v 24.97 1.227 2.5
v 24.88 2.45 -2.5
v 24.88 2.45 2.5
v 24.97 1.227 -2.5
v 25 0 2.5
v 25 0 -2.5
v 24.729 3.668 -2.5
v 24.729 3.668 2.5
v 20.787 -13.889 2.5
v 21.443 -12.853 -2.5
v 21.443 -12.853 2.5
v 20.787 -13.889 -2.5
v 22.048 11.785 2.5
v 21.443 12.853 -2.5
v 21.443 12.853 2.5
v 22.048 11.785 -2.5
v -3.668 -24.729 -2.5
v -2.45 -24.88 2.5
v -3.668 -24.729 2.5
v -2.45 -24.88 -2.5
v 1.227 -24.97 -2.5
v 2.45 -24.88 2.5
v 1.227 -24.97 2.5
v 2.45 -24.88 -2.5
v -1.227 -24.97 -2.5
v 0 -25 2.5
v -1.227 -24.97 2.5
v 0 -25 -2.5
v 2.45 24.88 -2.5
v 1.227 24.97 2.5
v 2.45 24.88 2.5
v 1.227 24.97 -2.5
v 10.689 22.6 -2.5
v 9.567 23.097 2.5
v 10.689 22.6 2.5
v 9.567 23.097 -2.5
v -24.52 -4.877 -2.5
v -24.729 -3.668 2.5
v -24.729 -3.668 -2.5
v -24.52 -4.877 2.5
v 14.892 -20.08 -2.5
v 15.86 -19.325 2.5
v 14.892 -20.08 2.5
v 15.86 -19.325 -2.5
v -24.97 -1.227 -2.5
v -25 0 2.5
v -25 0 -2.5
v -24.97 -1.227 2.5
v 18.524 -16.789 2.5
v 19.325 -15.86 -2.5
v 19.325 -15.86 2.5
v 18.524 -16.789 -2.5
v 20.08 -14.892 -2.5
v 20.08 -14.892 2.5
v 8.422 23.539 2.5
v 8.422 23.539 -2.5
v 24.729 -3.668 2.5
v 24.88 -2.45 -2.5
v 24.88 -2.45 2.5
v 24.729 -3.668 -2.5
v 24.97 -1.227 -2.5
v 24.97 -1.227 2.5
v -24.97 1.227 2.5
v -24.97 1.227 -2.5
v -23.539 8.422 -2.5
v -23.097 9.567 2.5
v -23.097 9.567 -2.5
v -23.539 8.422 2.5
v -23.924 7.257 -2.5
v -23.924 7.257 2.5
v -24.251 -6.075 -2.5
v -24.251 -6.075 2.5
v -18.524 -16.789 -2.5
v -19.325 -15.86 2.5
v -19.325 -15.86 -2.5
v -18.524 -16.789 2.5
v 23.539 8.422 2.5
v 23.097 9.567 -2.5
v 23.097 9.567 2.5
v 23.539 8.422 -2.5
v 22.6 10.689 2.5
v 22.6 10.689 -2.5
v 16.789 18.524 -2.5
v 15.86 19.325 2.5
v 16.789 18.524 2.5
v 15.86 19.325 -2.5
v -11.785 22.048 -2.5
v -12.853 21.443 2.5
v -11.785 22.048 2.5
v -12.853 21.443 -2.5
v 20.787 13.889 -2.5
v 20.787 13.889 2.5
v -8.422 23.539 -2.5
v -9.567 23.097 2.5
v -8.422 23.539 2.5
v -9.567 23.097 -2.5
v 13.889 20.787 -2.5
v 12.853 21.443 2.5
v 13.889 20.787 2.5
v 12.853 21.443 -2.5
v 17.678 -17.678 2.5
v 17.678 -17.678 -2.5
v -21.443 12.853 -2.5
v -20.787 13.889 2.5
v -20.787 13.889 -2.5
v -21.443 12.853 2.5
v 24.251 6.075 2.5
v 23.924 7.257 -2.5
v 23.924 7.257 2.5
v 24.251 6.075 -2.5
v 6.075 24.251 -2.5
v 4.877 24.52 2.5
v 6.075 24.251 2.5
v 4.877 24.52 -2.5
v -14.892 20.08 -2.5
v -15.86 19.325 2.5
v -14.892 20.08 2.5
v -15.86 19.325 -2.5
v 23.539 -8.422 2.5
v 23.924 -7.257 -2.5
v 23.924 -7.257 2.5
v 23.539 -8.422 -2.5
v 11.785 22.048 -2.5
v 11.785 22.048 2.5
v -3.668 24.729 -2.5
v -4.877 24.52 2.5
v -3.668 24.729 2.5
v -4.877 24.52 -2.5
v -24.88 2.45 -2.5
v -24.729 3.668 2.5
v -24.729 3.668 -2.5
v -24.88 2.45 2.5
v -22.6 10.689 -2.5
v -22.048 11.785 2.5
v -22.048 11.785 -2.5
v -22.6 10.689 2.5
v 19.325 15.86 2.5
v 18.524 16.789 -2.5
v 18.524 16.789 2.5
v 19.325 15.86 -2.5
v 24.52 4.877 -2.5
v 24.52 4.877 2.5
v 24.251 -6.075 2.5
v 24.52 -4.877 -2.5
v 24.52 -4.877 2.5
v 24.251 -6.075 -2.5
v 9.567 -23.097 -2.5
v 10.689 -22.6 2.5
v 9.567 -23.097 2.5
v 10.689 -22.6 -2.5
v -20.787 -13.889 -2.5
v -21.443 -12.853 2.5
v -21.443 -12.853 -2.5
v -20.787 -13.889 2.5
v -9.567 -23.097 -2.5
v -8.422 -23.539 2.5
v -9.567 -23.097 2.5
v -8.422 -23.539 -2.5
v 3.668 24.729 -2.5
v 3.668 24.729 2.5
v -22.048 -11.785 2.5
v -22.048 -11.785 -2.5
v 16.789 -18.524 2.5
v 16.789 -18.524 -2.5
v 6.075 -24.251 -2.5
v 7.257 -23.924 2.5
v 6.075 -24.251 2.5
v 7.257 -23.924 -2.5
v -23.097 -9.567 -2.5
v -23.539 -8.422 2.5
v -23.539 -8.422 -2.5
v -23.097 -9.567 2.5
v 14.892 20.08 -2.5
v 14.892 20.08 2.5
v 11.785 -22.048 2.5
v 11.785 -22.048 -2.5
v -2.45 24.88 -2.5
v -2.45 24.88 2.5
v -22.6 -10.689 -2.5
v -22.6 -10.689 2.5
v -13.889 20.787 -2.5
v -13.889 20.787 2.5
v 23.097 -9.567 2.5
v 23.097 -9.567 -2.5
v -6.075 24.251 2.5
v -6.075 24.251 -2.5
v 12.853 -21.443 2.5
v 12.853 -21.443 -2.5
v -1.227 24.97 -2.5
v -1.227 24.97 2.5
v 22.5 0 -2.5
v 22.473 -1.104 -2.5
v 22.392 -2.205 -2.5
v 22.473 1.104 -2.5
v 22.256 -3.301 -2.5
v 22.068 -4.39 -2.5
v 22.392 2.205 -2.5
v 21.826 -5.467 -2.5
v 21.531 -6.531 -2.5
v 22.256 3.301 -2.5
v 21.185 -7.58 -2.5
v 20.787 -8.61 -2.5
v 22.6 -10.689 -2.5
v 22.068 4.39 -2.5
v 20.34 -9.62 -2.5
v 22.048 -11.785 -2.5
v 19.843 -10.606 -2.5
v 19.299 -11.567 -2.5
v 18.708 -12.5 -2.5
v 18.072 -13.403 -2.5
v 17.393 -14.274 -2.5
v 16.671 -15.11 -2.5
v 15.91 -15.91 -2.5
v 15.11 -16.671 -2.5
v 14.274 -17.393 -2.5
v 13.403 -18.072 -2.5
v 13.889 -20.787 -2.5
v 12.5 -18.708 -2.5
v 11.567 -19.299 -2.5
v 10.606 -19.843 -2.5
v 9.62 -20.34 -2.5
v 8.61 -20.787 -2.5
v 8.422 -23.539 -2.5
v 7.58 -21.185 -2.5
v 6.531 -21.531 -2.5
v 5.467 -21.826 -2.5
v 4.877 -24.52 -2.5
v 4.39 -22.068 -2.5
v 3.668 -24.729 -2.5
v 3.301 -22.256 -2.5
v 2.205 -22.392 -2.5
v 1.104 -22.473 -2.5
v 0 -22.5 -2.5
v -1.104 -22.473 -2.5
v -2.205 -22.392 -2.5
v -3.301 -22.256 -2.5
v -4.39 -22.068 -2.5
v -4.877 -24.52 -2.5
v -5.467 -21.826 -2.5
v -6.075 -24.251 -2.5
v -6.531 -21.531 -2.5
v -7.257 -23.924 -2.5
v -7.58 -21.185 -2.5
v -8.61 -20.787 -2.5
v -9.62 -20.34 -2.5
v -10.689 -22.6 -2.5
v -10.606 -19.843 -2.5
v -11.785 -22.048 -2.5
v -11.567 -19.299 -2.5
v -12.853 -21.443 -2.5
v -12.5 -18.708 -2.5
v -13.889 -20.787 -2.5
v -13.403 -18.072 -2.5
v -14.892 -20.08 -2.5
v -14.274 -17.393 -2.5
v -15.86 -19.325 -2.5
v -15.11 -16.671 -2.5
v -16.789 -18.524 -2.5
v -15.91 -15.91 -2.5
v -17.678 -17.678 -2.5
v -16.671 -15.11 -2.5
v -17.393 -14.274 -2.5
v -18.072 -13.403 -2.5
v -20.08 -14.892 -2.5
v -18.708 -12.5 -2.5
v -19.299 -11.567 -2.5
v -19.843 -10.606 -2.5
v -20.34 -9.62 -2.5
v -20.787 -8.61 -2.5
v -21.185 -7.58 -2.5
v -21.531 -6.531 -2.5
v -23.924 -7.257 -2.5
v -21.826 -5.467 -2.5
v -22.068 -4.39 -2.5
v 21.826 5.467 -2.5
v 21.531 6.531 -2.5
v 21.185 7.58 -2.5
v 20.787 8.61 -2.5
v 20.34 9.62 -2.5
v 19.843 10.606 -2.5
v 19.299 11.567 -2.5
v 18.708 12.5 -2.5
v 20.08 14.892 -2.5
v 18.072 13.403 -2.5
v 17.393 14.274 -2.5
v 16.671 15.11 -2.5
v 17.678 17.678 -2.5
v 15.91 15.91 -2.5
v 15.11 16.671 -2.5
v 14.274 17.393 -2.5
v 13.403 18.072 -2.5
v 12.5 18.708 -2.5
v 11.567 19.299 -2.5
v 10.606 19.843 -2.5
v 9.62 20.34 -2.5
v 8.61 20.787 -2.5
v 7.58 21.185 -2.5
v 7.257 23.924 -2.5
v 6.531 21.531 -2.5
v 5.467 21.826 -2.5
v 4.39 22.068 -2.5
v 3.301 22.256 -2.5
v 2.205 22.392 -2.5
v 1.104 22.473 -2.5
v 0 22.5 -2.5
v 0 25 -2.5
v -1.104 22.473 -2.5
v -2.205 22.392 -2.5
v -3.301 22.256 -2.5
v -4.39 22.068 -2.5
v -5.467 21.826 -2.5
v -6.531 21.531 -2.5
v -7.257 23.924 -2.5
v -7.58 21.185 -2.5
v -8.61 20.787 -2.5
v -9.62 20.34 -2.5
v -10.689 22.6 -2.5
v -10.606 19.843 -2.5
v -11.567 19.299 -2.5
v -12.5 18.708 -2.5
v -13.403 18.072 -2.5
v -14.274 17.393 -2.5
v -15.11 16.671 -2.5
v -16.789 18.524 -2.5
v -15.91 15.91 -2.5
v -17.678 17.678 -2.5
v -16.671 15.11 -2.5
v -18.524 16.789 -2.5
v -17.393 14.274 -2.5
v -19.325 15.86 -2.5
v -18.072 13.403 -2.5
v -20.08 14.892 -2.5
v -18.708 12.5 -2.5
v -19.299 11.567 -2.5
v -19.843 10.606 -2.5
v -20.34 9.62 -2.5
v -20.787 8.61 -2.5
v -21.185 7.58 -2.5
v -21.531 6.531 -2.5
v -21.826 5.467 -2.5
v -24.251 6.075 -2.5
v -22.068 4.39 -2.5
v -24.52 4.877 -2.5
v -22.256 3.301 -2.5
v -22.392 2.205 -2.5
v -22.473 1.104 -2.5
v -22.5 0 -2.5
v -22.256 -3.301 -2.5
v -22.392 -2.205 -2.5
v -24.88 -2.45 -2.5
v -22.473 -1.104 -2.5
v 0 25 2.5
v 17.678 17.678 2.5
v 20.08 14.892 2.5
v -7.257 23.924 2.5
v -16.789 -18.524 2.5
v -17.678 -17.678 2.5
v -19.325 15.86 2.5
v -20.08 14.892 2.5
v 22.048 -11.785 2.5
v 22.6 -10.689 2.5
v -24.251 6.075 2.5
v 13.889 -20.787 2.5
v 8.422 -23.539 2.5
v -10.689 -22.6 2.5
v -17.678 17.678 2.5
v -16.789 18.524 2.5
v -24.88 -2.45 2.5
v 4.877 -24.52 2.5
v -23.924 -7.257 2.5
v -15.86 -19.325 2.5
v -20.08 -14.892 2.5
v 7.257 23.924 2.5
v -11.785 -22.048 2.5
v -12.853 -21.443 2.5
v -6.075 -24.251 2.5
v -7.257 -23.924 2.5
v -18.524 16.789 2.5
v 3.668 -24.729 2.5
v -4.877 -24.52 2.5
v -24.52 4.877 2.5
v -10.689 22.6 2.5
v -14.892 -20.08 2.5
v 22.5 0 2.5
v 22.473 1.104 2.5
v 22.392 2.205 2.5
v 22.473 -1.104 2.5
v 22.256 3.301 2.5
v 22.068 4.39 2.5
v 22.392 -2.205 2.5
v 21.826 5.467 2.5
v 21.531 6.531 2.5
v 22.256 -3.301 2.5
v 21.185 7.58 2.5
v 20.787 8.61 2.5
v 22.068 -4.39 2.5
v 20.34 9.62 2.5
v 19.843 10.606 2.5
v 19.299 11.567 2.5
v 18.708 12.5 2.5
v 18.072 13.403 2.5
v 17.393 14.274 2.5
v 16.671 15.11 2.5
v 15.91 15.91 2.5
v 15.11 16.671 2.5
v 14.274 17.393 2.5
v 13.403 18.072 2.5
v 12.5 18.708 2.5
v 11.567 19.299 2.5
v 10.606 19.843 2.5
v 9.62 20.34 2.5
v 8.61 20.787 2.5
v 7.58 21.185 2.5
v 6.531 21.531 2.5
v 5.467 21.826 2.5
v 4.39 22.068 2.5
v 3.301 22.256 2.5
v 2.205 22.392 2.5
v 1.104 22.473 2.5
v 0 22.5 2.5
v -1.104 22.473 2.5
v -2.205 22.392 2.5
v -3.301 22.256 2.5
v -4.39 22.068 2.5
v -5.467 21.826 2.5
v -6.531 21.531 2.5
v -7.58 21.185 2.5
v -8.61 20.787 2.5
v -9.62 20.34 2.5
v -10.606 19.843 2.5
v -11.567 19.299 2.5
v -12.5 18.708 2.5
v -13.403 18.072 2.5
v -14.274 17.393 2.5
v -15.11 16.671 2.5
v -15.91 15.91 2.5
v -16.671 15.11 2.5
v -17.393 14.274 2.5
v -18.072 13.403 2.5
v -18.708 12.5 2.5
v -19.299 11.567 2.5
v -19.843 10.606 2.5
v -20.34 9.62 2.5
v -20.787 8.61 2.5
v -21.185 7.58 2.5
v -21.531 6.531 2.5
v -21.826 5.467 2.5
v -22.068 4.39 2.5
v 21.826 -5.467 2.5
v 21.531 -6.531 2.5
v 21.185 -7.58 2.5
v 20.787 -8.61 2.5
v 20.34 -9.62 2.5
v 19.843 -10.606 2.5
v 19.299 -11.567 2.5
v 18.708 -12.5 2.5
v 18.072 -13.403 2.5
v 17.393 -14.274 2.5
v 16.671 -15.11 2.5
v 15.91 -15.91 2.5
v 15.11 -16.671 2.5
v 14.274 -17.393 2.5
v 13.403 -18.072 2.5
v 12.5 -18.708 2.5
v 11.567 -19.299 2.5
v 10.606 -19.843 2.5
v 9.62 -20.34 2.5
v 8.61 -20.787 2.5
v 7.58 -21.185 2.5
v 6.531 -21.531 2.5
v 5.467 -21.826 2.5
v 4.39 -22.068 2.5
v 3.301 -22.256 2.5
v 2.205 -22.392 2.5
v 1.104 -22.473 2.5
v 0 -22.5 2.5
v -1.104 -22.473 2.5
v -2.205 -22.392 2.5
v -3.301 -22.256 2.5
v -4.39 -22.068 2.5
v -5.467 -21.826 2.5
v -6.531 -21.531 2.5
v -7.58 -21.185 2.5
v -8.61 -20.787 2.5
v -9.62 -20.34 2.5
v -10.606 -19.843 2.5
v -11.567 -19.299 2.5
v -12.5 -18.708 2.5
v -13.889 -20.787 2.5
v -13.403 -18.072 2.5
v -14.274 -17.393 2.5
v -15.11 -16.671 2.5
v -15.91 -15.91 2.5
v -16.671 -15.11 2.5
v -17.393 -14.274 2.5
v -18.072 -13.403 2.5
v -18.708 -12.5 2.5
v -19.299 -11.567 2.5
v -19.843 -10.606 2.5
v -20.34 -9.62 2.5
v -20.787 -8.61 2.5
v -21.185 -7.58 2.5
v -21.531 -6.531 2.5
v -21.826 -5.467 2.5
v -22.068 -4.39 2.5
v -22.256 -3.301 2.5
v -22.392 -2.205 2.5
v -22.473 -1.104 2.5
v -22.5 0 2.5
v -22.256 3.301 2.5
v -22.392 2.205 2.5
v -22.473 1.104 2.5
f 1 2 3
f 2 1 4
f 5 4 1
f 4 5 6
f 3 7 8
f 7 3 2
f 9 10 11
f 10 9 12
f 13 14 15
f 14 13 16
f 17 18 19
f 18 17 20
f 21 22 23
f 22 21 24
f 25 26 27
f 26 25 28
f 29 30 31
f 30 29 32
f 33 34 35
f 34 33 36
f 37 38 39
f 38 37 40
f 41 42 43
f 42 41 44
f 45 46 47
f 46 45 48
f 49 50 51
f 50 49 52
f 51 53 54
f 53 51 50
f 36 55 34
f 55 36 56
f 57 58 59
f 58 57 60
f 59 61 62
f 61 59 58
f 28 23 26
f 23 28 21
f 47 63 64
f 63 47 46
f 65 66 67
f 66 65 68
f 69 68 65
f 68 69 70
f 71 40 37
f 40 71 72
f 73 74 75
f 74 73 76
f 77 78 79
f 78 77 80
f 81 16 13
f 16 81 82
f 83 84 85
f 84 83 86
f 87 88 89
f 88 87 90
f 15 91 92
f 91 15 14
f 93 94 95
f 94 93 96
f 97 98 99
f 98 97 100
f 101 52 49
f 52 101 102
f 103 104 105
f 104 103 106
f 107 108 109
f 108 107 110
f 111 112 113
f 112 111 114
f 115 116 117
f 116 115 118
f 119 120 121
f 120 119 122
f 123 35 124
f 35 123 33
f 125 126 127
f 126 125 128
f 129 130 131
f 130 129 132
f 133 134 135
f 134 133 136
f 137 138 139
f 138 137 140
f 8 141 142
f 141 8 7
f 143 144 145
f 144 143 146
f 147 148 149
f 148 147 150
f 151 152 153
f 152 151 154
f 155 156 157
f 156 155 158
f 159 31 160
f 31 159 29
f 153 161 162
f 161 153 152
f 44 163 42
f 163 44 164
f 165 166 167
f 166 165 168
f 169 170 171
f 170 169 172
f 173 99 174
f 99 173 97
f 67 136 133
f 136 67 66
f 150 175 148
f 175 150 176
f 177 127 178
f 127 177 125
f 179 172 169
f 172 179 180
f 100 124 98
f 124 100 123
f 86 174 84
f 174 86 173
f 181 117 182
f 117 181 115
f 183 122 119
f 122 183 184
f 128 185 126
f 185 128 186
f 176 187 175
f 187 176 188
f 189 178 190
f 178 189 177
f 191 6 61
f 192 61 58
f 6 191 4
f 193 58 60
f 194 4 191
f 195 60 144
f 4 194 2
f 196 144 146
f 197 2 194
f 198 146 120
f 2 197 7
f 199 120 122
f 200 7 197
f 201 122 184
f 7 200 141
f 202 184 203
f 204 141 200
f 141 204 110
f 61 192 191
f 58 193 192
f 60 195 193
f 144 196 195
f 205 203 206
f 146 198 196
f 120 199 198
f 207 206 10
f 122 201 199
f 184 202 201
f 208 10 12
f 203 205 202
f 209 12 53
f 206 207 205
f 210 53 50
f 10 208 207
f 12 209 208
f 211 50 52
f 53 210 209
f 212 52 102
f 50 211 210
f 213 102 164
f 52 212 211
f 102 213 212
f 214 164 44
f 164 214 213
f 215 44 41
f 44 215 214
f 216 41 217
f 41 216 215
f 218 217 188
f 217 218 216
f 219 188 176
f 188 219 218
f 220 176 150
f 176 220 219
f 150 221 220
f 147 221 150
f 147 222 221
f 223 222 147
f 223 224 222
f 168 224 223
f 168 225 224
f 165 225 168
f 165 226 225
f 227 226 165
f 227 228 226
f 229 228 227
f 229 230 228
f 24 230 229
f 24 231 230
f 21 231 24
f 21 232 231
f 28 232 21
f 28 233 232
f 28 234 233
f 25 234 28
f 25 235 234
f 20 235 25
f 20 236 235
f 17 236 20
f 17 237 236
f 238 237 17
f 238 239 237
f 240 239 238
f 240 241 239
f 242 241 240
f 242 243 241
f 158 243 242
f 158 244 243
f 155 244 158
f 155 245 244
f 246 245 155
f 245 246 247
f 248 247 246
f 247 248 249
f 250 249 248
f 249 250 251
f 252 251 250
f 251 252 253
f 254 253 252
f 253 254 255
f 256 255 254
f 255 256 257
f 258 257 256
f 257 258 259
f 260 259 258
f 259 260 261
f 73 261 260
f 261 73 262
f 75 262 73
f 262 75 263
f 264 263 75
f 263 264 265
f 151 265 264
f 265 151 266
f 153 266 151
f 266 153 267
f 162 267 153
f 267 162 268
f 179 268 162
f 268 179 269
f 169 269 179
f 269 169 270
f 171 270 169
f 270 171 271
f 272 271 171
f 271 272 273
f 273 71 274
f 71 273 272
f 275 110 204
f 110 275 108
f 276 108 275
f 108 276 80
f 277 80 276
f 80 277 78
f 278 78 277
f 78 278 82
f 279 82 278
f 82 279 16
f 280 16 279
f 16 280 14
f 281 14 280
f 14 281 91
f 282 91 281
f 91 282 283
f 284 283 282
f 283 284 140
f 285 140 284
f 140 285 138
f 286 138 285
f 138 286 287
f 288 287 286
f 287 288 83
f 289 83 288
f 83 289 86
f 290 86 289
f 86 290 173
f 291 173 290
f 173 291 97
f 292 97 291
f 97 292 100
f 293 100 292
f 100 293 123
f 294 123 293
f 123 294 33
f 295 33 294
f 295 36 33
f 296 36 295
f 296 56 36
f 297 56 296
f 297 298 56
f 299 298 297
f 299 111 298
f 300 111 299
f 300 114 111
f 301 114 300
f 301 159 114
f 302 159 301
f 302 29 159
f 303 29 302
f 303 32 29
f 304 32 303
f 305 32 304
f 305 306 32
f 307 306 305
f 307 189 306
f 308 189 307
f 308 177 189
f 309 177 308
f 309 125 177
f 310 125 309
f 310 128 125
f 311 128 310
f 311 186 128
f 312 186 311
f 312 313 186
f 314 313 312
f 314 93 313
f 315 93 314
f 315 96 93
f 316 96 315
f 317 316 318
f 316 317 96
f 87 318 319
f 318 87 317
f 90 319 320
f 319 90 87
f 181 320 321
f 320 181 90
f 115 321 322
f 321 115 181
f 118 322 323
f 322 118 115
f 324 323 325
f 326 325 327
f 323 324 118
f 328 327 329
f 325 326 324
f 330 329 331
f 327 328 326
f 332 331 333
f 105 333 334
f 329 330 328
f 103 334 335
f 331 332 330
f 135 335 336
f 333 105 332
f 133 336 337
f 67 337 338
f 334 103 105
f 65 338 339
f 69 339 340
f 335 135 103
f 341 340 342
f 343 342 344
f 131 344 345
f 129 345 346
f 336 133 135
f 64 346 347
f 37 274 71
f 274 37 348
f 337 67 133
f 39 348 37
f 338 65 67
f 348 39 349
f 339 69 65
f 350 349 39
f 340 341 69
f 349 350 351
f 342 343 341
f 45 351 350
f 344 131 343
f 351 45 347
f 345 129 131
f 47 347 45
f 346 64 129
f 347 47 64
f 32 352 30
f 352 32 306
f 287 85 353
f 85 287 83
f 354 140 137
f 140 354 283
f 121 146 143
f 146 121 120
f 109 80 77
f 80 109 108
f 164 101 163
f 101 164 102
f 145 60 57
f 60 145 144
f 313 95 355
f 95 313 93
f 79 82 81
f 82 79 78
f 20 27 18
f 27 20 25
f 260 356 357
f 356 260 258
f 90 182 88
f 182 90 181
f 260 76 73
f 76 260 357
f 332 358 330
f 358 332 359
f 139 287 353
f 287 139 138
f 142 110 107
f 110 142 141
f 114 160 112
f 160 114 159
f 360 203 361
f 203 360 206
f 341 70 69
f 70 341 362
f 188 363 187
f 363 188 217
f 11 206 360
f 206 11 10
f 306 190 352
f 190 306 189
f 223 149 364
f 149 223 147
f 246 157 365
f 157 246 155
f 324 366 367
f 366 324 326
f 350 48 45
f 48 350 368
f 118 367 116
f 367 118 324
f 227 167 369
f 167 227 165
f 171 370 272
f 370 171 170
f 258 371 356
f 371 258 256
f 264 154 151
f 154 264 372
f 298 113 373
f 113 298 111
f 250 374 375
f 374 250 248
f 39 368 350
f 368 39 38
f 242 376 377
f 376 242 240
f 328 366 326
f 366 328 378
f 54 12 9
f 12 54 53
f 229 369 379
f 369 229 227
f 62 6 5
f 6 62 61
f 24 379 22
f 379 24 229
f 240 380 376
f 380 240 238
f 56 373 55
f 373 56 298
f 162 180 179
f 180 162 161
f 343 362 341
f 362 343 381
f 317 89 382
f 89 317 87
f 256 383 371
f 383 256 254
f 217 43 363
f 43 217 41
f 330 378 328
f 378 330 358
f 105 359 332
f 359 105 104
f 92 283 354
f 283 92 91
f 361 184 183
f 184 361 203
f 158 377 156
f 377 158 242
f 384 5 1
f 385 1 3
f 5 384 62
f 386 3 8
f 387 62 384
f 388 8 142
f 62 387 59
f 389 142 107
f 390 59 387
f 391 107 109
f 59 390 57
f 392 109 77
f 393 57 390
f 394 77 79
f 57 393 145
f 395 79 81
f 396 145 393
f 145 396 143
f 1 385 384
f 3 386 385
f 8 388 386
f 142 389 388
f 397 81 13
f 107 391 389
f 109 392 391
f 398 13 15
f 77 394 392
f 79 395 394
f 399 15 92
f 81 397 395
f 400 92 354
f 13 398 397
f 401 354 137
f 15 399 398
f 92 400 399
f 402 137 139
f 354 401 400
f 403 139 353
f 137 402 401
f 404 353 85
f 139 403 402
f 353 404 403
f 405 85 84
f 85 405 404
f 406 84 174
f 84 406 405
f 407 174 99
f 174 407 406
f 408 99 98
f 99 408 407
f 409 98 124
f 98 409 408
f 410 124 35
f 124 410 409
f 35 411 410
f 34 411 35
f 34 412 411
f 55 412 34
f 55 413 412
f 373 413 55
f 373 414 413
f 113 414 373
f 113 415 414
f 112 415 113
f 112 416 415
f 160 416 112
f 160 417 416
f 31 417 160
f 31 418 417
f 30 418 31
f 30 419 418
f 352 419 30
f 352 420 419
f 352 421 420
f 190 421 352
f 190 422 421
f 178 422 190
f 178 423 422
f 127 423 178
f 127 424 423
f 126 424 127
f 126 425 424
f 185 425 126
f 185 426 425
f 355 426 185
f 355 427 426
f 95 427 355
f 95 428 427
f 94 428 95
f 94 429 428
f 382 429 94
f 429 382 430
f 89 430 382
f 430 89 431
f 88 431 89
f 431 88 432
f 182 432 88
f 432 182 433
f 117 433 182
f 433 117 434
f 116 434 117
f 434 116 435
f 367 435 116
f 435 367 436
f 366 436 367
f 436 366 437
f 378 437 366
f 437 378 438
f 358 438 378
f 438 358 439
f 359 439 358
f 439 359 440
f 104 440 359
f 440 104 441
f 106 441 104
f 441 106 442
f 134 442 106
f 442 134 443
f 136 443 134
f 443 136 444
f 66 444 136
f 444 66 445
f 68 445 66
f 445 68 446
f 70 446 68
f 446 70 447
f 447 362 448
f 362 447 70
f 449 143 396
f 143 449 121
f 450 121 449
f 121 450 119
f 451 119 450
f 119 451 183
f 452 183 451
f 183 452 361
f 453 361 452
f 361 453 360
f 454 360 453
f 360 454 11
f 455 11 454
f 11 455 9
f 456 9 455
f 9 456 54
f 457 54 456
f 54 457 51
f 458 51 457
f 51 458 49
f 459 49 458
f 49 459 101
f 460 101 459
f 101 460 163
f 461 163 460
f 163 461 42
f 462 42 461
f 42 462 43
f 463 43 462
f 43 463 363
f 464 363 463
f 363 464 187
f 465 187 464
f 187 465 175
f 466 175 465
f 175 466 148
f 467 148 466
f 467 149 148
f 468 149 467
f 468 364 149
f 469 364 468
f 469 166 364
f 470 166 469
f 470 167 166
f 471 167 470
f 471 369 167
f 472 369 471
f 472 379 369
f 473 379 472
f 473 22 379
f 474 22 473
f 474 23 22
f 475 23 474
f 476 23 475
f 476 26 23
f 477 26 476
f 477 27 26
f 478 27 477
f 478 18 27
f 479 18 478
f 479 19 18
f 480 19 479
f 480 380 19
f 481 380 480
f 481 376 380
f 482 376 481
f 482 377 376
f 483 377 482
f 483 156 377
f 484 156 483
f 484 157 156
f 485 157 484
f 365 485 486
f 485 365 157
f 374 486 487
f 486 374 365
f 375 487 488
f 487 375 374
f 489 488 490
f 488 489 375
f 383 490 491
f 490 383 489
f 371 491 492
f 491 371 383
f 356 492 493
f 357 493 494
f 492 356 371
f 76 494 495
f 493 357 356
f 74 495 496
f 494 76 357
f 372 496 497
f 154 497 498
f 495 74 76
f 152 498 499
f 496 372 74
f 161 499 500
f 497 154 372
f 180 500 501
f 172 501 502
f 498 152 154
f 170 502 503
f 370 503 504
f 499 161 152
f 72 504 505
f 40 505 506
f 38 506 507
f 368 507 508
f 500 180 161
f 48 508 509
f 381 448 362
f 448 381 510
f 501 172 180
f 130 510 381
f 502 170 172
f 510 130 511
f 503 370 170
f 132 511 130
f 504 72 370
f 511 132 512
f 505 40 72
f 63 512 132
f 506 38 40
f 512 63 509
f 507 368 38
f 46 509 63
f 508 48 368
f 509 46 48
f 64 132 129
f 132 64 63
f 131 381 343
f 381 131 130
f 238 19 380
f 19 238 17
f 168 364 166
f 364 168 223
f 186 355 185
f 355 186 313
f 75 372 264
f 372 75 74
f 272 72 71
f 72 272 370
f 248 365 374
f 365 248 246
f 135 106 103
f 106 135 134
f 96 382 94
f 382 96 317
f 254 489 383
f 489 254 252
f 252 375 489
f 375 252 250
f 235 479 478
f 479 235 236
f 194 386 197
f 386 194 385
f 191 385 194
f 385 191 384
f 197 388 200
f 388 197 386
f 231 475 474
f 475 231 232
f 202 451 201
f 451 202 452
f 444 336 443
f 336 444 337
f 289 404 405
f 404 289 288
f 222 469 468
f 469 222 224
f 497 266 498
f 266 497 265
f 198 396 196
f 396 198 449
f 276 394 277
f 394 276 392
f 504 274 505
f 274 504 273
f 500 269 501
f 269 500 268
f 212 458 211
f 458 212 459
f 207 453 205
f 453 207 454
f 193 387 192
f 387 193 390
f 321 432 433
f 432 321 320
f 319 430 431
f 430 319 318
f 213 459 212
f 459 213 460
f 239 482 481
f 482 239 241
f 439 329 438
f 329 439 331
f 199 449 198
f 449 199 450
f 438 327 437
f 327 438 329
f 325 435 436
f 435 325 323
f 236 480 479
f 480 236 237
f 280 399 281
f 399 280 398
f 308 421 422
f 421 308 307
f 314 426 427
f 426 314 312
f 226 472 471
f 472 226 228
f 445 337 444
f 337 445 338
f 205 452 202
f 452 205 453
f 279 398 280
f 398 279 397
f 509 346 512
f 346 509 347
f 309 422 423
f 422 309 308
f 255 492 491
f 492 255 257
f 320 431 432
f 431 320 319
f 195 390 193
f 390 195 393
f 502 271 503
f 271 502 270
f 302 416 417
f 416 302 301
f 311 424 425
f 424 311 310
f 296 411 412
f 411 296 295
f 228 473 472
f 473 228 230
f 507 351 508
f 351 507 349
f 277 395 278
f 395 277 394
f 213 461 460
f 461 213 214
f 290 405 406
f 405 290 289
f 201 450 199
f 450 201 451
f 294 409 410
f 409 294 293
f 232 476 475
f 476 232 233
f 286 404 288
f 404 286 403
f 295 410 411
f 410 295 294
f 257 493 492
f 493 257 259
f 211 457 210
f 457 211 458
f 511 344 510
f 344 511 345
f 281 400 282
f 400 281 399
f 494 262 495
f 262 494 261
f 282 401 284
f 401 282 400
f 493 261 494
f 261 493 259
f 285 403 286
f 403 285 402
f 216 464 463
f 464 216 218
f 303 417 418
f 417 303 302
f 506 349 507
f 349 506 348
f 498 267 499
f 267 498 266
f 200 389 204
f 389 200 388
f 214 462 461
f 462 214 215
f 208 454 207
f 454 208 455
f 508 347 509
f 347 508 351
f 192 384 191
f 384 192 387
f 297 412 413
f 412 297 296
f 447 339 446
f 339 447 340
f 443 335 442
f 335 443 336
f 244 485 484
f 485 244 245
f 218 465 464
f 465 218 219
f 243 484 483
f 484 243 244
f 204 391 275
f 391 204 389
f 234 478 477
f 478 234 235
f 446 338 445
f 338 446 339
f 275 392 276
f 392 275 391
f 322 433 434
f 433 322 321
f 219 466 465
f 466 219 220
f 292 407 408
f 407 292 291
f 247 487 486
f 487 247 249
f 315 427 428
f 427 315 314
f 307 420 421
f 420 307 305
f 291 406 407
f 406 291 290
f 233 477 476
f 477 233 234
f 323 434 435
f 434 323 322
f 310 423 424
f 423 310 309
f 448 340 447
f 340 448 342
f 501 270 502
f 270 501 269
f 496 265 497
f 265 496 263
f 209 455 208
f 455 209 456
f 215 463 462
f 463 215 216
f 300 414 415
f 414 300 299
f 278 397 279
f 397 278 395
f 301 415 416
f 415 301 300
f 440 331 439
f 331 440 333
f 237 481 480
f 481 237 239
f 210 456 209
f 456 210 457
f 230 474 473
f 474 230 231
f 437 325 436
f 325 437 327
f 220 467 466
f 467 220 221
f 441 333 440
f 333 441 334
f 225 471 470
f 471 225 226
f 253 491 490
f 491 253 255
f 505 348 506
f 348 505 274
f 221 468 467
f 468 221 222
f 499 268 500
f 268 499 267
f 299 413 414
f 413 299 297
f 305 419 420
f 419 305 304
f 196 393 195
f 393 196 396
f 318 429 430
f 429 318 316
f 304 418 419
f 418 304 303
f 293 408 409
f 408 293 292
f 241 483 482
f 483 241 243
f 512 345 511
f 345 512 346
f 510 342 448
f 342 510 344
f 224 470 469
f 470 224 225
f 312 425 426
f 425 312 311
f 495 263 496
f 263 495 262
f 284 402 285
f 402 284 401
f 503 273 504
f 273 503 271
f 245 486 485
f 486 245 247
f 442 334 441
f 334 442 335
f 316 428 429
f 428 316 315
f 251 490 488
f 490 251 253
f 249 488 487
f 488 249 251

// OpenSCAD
$fn = 128;
/* difference() {
    cylinder(d=18.85+2, h=5, center=true);
    #cylinder(d=18.85, h=12, center=true);
    cylinder(d=19, h=12, center=true);

}
 */
translate([0,0,0]) difference(){
    cylinder(r=25, h=5, center=true);
    cylinder(r=22.5, h=15, center=true);

    }
